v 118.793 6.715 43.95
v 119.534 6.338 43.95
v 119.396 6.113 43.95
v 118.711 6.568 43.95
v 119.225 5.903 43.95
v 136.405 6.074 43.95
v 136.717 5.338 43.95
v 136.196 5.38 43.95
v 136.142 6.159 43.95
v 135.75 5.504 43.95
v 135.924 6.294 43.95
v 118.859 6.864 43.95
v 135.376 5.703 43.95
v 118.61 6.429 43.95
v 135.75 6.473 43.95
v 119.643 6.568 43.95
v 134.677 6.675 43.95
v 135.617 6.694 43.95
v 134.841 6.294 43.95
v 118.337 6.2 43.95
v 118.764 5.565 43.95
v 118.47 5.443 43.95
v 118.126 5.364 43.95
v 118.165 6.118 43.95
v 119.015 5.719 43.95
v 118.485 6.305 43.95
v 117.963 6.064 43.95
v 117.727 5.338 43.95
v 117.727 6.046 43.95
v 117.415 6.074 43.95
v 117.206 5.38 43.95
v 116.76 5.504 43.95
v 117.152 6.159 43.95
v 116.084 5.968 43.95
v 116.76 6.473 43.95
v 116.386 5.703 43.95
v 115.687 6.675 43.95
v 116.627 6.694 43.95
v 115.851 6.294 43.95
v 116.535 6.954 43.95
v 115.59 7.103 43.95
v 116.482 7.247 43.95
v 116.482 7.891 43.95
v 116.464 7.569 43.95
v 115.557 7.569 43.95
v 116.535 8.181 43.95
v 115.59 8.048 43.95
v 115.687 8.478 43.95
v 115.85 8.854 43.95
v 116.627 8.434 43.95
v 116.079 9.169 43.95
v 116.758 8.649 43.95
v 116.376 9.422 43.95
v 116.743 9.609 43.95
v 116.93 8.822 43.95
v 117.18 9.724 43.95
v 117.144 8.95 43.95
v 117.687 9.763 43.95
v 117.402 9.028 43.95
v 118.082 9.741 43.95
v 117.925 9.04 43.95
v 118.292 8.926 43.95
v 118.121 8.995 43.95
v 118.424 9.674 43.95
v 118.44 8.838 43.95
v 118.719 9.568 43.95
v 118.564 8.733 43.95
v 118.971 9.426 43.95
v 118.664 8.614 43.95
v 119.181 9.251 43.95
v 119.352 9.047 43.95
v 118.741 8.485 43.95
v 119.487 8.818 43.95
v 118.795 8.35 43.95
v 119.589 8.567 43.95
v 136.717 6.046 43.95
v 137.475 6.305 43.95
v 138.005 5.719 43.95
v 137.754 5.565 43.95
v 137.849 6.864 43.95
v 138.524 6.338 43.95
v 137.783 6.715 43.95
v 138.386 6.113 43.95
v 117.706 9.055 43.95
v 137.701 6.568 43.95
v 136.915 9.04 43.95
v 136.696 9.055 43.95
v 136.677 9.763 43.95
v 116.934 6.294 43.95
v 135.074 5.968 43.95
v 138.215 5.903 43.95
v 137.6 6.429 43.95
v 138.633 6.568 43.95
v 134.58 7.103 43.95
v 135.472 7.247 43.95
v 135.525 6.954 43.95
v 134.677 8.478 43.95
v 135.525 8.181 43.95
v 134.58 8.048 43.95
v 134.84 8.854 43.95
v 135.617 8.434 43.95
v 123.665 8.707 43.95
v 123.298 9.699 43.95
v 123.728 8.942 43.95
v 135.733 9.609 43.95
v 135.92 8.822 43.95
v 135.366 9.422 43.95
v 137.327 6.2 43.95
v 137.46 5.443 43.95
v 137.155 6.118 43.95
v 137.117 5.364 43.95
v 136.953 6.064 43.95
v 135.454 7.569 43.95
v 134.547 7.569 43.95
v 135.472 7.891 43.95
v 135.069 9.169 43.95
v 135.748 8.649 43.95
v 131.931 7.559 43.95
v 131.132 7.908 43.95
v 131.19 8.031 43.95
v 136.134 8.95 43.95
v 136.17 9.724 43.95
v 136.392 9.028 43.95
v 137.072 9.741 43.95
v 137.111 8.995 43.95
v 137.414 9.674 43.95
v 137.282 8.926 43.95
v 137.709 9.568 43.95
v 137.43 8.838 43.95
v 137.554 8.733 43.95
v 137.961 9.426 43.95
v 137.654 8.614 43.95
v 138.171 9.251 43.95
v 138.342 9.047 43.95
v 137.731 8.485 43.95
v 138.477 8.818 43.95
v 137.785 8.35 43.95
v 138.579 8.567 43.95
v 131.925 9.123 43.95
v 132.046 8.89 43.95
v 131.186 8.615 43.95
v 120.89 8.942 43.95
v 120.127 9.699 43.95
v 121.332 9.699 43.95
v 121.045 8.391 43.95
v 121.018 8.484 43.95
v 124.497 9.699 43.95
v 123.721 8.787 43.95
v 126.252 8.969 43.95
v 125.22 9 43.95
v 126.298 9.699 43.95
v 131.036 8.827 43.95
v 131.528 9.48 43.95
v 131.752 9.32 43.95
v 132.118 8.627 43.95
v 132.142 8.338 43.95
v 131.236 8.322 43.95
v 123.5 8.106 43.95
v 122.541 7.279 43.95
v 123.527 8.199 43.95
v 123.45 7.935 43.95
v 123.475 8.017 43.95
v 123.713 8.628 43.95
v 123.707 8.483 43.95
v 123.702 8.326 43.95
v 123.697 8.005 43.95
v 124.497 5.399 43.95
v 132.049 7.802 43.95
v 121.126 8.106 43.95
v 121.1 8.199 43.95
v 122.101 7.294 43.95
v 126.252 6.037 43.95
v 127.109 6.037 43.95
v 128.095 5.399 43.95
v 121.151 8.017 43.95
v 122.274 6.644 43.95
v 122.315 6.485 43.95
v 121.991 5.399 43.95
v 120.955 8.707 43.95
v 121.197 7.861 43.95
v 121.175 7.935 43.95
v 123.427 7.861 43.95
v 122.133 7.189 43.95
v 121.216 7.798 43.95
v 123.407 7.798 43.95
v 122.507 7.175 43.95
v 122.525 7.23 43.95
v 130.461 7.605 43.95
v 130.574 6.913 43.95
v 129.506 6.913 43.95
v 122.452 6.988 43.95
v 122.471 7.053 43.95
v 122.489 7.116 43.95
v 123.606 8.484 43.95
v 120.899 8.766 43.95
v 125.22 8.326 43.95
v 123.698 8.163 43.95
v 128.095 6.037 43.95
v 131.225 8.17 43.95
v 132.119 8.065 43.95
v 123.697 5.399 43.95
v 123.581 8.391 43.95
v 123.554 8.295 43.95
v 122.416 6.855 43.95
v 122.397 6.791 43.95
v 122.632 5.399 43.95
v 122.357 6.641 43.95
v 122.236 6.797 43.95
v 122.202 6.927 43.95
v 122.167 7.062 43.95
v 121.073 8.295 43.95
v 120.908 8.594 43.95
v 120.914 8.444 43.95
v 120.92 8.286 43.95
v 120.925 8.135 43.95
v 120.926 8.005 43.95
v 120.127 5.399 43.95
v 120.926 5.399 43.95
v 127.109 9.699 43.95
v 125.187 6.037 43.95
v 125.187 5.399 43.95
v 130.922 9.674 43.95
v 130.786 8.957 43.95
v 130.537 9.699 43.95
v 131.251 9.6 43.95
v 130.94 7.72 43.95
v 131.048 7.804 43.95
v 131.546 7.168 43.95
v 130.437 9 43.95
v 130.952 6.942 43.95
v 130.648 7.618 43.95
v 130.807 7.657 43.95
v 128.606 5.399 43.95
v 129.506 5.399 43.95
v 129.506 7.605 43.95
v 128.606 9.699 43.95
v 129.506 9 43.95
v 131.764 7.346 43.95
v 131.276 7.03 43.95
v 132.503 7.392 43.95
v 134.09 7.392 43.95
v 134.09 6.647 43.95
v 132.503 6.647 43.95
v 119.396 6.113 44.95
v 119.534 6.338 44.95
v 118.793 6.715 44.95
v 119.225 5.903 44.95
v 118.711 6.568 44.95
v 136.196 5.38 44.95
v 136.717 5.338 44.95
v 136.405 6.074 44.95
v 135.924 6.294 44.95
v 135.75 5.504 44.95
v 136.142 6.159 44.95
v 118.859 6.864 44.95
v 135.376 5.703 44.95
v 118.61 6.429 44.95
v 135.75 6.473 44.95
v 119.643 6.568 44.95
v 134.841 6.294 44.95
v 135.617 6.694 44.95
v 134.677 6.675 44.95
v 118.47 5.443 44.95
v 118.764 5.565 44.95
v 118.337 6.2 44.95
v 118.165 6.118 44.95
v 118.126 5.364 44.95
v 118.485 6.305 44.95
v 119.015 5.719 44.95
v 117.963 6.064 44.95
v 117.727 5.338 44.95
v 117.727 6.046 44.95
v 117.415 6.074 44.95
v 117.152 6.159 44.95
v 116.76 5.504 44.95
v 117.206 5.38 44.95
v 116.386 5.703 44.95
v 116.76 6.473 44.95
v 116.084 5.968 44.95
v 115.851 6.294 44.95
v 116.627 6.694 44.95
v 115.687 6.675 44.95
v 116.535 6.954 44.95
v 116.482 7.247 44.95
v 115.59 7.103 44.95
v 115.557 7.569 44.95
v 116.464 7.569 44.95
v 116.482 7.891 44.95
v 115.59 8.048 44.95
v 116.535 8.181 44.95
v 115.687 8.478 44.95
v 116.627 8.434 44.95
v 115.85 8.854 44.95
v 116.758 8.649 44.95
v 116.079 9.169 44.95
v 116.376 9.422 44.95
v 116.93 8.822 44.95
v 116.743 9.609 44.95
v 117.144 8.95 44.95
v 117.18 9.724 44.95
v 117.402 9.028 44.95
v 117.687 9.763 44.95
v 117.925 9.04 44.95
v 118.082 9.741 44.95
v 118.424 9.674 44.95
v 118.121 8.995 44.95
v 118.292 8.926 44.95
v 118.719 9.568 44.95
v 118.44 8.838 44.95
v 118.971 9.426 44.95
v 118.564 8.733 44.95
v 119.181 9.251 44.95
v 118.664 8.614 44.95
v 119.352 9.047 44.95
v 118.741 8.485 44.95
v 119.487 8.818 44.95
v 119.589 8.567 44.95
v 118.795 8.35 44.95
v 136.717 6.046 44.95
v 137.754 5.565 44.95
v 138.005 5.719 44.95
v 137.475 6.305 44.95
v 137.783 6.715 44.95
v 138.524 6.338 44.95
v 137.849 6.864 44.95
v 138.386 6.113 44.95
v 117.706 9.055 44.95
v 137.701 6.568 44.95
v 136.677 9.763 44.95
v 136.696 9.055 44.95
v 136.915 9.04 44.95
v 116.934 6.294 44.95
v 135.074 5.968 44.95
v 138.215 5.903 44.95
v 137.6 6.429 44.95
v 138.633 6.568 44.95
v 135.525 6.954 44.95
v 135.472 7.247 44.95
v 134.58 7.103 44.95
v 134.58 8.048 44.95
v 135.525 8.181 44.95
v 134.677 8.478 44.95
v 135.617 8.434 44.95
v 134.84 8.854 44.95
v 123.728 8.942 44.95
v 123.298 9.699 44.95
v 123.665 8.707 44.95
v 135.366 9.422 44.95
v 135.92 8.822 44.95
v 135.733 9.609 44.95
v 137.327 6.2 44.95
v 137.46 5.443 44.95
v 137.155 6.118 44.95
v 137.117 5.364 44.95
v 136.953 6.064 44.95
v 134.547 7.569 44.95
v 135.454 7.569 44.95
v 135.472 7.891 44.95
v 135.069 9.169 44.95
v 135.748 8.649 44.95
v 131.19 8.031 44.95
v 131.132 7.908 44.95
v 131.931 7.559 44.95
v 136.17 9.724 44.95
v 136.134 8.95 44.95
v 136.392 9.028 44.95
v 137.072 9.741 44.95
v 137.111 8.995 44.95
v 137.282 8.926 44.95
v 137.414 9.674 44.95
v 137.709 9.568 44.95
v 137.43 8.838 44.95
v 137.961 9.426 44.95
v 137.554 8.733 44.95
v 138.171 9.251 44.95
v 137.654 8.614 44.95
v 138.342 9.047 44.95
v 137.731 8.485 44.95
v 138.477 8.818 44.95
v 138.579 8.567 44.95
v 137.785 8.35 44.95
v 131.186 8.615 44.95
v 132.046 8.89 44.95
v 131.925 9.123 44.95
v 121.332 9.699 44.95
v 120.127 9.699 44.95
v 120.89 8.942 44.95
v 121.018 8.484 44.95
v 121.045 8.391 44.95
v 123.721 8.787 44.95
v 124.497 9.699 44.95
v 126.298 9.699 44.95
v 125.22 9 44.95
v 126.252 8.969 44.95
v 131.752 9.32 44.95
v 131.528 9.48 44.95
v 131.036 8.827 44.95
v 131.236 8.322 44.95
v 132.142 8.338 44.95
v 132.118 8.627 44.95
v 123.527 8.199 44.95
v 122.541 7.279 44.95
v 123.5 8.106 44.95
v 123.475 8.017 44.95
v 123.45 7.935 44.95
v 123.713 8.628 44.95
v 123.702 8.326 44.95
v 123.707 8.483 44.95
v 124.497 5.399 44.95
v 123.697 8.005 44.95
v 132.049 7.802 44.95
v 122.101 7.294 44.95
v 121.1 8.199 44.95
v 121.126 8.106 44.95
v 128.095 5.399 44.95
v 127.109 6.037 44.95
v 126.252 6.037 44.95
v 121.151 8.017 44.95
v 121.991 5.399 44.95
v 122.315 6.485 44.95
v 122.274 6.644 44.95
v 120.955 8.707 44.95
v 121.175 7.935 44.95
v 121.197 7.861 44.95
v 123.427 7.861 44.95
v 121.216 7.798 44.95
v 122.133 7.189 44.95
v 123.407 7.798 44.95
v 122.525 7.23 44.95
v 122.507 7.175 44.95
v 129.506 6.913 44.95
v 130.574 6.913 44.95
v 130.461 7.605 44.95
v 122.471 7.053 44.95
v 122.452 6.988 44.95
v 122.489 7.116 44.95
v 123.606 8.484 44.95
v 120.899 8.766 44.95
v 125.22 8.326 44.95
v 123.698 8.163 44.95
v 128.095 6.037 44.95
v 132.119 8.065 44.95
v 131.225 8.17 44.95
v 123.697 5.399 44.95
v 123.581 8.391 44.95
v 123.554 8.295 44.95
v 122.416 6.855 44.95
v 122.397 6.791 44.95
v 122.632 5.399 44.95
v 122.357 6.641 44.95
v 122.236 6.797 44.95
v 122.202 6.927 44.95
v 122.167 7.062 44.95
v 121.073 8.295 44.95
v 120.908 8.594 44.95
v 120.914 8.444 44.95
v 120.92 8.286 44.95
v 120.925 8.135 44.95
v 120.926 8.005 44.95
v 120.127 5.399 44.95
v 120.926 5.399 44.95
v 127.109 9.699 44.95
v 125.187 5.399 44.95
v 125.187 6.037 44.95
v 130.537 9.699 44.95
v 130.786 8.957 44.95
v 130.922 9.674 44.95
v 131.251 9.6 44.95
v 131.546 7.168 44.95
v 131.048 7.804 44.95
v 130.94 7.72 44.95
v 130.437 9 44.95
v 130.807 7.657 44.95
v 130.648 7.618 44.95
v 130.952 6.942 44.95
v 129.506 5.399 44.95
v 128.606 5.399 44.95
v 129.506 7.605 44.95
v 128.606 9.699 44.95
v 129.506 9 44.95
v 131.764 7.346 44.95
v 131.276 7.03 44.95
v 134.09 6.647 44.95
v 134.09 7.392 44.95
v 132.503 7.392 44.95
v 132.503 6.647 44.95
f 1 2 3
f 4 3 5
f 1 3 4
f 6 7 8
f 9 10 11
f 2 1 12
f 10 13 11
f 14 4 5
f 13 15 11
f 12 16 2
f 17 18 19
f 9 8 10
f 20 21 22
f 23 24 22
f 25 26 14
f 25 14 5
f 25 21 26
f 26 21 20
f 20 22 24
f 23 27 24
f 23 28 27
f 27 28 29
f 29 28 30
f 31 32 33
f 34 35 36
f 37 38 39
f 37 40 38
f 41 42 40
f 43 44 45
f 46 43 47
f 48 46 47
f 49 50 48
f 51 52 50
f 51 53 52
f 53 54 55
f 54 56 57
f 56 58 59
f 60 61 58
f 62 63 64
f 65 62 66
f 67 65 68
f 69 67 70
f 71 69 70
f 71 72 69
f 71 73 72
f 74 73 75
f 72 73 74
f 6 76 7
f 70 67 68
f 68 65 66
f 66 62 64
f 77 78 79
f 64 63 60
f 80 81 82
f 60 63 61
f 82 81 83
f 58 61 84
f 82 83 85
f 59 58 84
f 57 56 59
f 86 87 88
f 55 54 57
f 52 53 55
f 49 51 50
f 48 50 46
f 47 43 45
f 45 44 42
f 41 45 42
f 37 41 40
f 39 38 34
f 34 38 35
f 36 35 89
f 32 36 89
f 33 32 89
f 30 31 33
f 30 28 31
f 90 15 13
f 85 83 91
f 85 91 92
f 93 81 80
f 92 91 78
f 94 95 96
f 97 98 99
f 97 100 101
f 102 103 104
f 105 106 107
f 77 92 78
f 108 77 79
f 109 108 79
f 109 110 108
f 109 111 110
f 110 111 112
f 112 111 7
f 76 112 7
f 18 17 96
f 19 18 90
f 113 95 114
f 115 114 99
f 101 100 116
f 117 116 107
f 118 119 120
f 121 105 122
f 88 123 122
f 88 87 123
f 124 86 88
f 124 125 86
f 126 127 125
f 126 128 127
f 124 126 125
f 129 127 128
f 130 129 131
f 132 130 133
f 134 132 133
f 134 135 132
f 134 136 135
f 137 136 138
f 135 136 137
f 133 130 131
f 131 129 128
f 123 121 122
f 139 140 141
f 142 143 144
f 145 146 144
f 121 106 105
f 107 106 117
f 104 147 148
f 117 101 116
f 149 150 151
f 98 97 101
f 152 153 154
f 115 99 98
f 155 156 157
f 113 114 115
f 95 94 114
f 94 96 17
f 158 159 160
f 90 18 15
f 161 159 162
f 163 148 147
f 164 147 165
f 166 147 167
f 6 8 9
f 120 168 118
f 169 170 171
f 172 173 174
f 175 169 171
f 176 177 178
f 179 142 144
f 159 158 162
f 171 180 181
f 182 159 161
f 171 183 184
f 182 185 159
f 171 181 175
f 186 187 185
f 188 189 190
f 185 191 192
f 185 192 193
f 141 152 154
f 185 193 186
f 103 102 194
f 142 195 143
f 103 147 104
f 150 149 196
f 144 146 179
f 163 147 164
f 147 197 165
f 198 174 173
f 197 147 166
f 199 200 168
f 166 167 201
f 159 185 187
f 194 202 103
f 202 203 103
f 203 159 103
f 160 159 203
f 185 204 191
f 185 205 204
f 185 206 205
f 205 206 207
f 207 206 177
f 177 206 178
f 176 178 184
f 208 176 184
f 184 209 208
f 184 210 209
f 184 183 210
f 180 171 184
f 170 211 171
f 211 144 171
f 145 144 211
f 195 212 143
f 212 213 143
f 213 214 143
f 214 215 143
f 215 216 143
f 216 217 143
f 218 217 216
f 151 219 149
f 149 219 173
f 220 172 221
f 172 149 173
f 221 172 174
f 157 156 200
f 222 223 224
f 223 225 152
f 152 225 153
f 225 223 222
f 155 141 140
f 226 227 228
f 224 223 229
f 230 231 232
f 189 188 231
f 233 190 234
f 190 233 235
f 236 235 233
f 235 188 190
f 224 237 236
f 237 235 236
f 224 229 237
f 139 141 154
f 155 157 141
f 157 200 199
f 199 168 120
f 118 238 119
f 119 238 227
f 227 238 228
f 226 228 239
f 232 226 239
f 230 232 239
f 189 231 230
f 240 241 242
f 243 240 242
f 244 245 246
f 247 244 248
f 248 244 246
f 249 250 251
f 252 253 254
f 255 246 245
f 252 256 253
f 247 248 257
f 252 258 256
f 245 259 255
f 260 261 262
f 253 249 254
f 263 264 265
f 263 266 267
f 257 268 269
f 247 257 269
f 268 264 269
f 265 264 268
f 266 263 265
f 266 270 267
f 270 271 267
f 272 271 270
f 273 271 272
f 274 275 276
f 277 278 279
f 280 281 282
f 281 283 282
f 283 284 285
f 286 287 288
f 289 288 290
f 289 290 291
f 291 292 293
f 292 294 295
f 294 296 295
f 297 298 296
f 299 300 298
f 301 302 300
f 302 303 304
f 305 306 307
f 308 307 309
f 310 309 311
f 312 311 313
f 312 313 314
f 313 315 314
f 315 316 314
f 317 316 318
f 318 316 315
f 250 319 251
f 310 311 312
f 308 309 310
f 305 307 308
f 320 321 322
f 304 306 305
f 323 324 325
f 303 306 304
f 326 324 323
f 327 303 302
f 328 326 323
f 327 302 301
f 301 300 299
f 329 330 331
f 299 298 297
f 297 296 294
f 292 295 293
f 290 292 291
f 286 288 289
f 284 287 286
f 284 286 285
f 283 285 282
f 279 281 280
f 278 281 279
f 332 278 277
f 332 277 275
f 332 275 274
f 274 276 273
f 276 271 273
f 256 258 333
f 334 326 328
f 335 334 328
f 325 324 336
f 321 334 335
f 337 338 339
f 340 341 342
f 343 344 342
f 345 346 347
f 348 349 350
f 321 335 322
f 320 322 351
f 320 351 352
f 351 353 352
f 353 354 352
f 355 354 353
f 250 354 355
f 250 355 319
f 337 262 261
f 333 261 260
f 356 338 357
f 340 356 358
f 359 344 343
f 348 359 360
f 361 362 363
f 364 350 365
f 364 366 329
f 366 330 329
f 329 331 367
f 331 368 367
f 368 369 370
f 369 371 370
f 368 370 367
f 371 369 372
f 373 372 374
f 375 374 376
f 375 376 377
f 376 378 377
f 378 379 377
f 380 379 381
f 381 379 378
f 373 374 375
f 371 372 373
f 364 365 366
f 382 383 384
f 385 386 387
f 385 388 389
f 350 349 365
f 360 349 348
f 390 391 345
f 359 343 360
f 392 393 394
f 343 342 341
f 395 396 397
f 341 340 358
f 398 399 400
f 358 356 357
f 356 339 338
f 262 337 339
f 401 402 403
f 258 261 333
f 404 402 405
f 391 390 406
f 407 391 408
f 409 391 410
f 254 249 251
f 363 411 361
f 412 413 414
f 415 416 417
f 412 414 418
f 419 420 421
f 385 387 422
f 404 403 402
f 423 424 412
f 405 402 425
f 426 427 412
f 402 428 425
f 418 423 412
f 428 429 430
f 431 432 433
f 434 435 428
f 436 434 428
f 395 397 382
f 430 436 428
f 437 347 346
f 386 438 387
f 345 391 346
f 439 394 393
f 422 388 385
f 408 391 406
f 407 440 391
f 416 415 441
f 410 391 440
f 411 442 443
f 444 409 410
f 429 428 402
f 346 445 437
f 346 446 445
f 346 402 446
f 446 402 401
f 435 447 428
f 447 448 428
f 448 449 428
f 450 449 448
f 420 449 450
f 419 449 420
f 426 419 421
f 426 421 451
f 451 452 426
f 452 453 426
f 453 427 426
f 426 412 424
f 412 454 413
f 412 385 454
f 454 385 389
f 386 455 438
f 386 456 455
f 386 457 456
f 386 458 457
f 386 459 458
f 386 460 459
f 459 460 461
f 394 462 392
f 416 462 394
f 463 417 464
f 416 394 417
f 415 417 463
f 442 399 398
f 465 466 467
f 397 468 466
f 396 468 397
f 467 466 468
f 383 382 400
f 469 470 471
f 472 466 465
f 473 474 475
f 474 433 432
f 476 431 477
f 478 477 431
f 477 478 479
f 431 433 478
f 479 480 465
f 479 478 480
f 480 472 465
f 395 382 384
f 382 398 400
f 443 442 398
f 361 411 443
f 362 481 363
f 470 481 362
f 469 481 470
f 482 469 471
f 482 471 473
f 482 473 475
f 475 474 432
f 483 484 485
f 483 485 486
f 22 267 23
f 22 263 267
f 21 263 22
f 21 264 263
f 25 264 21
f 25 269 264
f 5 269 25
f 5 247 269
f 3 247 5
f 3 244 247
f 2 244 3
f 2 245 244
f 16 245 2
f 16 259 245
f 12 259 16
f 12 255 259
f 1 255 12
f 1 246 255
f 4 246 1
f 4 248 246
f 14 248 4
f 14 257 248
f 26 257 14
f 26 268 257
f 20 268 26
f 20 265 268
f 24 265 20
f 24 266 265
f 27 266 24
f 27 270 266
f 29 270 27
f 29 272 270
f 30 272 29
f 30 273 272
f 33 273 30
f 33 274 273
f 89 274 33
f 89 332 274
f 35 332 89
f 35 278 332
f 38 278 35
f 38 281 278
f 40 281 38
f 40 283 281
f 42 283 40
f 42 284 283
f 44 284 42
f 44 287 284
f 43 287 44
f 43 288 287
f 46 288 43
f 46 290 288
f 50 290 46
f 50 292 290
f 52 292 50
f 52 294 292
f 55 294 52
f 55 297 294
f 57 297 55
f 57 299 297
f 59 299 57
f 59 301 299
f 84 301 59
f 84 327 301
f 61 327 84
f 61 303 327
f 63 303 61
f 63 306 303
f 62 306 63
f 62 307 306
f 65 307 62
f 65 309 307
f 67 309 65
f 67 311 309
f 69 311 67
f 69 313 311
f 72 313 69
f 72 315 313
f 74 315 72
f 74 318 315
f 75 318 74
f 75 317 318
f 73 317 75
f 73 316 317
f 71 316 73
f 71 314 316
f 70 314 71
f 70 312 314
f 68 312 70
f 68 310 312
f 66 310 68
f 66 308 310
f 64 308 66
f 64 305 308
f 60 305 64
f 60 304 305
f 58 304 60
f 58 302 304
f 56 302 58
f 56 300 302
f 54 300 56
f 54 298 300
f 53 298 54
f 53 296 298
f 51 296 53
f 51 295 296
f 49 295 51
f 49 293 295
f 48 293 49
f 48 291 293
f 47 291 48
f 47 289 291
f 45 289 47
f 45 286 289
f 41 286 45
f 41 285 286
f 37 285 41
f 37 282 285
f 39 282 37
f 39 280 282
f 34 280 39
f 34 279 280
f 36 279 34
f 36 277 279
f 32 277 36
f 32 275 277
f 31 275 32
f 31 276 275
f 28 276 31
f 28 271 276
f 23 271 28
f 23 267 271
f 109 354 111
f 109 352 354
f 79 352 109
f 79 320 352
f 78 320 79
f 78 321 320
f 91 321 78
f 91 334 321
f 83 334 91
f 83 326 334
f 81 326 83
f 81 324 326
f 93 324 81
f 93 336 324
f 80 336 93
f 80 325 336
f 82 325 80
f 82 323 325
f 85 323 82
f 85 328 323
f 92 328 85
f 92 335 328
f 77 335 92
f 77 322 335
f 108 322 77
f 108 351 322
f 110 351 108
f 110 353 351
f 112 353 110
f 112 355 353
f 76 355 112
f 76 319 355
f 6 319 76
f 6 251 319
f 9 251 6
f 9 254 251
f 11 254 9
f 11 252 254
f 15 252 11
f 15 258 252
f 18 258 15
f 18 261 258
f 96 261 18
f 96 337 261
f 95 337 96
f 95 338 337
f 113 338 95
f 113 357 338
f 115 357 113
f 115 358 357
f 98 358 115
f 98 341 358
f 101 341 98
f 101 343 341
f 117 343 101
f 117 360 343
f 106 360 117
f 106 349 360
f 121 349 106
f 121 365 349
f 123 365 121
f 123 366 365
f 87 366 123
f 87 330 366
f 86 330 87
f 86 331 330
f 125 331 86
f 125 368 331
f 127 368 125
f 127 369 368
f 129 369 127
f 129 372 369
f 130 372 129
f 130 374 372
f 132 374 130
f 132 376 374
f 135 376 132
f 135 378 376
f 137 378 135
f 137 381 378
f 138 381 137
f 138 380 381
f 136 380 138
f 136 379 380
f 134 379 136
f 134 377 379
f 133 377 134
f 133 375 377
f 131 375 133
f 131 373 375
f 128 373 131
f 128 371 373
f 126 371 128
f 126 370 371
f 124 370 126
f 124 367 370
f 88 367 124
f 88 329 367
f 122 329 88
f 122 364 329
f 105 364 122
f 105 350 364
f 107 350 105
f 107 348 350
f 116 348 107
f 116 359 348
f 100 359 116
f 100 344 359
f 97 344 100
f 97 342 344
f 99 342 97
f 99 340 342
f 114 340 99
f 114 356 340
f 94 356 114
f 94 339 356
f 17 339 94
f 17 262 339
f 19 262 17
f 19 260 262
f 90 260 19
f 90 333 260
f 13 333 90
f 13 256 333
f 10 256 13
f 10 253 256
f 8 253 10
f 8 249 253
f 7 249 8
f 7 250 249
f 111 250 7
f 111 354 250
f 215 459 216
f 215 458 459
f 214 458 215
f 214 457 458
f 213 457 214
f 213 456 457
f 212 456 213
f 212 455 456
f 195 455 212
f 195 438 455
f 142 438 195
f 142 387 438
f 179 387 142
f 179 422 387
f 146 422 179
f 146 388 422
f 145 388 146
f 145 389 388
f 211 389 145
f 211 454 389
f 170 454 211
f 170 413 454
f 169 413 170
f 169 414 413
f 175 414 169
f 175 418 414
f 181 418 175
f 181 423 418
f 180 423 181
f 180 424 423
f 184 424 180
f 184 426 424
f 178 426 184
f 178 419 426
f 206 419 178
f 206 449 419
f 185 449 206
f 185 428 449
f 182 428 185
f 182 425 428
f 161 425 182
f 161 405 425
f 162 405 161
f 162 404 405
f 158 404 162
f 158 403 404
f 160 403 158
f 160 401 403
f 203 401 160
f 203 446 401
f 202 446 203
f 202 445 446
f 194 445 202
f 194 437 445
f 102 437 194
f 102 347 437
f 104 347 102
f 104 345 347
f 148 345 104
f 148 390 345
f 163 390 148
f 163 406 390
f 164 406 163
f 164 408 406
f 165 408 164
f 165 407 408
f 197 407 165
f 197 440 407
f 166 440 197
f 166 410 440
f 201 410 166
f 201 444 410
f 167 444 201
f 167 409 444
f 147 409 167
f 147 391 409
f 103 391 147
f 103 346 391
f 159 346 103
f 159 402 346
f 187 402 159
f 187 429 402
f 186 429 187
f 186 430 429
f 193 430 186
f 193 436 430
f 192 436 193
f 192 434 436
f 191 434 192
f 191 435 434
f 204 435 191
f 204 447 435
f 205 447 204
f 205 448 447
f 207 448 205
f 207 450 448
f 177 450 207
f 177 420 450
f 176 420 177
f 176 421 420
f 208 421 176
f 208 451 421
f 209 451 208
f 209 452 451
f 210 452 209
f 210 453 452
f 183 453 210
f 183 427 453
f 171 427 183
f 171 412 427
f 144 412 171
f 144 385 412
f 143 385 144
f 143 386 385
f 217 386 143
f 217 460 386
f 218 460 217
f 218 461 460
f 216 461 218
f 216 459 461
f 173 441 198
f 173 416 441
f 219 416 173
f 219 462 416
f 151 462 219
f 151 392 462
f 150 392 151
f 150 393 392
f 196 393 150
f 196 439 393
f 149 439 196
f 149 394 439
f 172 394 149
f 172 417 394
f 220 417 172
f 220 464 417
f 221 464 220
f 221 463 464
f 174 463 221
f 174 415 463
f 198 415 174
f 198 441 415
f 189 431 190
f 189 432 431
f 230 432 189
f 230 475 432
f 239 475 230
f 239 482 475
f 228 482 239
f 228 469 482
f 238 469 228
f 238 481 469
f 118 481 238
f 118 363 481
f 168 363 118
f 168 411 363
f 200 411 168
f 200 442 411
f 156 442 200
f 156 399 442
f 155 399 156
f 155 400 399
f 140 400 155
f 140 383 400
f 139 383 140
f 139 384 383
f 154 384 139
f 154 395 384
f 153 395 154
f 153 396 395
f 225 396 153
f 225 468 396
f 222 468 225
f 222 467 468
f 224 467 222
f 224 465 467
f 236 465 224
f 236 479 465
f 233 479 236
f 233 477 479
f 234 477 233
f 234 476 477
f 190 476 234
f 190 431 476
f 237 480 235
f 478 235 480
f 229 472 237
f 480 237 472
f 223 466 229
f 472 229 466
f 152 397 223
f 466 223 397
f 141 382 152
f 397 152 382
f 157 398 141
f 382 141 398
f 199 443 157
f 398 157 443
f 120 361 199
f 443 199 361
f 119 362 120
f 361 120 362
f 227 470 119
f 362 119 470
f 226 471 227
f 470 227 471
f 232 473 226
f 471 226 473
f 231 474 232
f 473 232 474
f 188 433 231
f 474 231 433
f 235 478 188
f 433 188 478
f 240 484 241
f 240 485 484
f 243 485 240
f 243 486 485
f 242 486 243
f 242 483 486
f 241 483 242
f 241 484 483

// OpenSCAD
// CM1P-C ID text, engraved 0.5 into the plate's top face (frame as cm1p_a_freecad.py).
translate([127, 7.5, 43.95]) linear_extrude(1) text("CM1P-C", size = 4.5, font = "Liberation Sans:style=Bold", halign = "center", valign = "center");
